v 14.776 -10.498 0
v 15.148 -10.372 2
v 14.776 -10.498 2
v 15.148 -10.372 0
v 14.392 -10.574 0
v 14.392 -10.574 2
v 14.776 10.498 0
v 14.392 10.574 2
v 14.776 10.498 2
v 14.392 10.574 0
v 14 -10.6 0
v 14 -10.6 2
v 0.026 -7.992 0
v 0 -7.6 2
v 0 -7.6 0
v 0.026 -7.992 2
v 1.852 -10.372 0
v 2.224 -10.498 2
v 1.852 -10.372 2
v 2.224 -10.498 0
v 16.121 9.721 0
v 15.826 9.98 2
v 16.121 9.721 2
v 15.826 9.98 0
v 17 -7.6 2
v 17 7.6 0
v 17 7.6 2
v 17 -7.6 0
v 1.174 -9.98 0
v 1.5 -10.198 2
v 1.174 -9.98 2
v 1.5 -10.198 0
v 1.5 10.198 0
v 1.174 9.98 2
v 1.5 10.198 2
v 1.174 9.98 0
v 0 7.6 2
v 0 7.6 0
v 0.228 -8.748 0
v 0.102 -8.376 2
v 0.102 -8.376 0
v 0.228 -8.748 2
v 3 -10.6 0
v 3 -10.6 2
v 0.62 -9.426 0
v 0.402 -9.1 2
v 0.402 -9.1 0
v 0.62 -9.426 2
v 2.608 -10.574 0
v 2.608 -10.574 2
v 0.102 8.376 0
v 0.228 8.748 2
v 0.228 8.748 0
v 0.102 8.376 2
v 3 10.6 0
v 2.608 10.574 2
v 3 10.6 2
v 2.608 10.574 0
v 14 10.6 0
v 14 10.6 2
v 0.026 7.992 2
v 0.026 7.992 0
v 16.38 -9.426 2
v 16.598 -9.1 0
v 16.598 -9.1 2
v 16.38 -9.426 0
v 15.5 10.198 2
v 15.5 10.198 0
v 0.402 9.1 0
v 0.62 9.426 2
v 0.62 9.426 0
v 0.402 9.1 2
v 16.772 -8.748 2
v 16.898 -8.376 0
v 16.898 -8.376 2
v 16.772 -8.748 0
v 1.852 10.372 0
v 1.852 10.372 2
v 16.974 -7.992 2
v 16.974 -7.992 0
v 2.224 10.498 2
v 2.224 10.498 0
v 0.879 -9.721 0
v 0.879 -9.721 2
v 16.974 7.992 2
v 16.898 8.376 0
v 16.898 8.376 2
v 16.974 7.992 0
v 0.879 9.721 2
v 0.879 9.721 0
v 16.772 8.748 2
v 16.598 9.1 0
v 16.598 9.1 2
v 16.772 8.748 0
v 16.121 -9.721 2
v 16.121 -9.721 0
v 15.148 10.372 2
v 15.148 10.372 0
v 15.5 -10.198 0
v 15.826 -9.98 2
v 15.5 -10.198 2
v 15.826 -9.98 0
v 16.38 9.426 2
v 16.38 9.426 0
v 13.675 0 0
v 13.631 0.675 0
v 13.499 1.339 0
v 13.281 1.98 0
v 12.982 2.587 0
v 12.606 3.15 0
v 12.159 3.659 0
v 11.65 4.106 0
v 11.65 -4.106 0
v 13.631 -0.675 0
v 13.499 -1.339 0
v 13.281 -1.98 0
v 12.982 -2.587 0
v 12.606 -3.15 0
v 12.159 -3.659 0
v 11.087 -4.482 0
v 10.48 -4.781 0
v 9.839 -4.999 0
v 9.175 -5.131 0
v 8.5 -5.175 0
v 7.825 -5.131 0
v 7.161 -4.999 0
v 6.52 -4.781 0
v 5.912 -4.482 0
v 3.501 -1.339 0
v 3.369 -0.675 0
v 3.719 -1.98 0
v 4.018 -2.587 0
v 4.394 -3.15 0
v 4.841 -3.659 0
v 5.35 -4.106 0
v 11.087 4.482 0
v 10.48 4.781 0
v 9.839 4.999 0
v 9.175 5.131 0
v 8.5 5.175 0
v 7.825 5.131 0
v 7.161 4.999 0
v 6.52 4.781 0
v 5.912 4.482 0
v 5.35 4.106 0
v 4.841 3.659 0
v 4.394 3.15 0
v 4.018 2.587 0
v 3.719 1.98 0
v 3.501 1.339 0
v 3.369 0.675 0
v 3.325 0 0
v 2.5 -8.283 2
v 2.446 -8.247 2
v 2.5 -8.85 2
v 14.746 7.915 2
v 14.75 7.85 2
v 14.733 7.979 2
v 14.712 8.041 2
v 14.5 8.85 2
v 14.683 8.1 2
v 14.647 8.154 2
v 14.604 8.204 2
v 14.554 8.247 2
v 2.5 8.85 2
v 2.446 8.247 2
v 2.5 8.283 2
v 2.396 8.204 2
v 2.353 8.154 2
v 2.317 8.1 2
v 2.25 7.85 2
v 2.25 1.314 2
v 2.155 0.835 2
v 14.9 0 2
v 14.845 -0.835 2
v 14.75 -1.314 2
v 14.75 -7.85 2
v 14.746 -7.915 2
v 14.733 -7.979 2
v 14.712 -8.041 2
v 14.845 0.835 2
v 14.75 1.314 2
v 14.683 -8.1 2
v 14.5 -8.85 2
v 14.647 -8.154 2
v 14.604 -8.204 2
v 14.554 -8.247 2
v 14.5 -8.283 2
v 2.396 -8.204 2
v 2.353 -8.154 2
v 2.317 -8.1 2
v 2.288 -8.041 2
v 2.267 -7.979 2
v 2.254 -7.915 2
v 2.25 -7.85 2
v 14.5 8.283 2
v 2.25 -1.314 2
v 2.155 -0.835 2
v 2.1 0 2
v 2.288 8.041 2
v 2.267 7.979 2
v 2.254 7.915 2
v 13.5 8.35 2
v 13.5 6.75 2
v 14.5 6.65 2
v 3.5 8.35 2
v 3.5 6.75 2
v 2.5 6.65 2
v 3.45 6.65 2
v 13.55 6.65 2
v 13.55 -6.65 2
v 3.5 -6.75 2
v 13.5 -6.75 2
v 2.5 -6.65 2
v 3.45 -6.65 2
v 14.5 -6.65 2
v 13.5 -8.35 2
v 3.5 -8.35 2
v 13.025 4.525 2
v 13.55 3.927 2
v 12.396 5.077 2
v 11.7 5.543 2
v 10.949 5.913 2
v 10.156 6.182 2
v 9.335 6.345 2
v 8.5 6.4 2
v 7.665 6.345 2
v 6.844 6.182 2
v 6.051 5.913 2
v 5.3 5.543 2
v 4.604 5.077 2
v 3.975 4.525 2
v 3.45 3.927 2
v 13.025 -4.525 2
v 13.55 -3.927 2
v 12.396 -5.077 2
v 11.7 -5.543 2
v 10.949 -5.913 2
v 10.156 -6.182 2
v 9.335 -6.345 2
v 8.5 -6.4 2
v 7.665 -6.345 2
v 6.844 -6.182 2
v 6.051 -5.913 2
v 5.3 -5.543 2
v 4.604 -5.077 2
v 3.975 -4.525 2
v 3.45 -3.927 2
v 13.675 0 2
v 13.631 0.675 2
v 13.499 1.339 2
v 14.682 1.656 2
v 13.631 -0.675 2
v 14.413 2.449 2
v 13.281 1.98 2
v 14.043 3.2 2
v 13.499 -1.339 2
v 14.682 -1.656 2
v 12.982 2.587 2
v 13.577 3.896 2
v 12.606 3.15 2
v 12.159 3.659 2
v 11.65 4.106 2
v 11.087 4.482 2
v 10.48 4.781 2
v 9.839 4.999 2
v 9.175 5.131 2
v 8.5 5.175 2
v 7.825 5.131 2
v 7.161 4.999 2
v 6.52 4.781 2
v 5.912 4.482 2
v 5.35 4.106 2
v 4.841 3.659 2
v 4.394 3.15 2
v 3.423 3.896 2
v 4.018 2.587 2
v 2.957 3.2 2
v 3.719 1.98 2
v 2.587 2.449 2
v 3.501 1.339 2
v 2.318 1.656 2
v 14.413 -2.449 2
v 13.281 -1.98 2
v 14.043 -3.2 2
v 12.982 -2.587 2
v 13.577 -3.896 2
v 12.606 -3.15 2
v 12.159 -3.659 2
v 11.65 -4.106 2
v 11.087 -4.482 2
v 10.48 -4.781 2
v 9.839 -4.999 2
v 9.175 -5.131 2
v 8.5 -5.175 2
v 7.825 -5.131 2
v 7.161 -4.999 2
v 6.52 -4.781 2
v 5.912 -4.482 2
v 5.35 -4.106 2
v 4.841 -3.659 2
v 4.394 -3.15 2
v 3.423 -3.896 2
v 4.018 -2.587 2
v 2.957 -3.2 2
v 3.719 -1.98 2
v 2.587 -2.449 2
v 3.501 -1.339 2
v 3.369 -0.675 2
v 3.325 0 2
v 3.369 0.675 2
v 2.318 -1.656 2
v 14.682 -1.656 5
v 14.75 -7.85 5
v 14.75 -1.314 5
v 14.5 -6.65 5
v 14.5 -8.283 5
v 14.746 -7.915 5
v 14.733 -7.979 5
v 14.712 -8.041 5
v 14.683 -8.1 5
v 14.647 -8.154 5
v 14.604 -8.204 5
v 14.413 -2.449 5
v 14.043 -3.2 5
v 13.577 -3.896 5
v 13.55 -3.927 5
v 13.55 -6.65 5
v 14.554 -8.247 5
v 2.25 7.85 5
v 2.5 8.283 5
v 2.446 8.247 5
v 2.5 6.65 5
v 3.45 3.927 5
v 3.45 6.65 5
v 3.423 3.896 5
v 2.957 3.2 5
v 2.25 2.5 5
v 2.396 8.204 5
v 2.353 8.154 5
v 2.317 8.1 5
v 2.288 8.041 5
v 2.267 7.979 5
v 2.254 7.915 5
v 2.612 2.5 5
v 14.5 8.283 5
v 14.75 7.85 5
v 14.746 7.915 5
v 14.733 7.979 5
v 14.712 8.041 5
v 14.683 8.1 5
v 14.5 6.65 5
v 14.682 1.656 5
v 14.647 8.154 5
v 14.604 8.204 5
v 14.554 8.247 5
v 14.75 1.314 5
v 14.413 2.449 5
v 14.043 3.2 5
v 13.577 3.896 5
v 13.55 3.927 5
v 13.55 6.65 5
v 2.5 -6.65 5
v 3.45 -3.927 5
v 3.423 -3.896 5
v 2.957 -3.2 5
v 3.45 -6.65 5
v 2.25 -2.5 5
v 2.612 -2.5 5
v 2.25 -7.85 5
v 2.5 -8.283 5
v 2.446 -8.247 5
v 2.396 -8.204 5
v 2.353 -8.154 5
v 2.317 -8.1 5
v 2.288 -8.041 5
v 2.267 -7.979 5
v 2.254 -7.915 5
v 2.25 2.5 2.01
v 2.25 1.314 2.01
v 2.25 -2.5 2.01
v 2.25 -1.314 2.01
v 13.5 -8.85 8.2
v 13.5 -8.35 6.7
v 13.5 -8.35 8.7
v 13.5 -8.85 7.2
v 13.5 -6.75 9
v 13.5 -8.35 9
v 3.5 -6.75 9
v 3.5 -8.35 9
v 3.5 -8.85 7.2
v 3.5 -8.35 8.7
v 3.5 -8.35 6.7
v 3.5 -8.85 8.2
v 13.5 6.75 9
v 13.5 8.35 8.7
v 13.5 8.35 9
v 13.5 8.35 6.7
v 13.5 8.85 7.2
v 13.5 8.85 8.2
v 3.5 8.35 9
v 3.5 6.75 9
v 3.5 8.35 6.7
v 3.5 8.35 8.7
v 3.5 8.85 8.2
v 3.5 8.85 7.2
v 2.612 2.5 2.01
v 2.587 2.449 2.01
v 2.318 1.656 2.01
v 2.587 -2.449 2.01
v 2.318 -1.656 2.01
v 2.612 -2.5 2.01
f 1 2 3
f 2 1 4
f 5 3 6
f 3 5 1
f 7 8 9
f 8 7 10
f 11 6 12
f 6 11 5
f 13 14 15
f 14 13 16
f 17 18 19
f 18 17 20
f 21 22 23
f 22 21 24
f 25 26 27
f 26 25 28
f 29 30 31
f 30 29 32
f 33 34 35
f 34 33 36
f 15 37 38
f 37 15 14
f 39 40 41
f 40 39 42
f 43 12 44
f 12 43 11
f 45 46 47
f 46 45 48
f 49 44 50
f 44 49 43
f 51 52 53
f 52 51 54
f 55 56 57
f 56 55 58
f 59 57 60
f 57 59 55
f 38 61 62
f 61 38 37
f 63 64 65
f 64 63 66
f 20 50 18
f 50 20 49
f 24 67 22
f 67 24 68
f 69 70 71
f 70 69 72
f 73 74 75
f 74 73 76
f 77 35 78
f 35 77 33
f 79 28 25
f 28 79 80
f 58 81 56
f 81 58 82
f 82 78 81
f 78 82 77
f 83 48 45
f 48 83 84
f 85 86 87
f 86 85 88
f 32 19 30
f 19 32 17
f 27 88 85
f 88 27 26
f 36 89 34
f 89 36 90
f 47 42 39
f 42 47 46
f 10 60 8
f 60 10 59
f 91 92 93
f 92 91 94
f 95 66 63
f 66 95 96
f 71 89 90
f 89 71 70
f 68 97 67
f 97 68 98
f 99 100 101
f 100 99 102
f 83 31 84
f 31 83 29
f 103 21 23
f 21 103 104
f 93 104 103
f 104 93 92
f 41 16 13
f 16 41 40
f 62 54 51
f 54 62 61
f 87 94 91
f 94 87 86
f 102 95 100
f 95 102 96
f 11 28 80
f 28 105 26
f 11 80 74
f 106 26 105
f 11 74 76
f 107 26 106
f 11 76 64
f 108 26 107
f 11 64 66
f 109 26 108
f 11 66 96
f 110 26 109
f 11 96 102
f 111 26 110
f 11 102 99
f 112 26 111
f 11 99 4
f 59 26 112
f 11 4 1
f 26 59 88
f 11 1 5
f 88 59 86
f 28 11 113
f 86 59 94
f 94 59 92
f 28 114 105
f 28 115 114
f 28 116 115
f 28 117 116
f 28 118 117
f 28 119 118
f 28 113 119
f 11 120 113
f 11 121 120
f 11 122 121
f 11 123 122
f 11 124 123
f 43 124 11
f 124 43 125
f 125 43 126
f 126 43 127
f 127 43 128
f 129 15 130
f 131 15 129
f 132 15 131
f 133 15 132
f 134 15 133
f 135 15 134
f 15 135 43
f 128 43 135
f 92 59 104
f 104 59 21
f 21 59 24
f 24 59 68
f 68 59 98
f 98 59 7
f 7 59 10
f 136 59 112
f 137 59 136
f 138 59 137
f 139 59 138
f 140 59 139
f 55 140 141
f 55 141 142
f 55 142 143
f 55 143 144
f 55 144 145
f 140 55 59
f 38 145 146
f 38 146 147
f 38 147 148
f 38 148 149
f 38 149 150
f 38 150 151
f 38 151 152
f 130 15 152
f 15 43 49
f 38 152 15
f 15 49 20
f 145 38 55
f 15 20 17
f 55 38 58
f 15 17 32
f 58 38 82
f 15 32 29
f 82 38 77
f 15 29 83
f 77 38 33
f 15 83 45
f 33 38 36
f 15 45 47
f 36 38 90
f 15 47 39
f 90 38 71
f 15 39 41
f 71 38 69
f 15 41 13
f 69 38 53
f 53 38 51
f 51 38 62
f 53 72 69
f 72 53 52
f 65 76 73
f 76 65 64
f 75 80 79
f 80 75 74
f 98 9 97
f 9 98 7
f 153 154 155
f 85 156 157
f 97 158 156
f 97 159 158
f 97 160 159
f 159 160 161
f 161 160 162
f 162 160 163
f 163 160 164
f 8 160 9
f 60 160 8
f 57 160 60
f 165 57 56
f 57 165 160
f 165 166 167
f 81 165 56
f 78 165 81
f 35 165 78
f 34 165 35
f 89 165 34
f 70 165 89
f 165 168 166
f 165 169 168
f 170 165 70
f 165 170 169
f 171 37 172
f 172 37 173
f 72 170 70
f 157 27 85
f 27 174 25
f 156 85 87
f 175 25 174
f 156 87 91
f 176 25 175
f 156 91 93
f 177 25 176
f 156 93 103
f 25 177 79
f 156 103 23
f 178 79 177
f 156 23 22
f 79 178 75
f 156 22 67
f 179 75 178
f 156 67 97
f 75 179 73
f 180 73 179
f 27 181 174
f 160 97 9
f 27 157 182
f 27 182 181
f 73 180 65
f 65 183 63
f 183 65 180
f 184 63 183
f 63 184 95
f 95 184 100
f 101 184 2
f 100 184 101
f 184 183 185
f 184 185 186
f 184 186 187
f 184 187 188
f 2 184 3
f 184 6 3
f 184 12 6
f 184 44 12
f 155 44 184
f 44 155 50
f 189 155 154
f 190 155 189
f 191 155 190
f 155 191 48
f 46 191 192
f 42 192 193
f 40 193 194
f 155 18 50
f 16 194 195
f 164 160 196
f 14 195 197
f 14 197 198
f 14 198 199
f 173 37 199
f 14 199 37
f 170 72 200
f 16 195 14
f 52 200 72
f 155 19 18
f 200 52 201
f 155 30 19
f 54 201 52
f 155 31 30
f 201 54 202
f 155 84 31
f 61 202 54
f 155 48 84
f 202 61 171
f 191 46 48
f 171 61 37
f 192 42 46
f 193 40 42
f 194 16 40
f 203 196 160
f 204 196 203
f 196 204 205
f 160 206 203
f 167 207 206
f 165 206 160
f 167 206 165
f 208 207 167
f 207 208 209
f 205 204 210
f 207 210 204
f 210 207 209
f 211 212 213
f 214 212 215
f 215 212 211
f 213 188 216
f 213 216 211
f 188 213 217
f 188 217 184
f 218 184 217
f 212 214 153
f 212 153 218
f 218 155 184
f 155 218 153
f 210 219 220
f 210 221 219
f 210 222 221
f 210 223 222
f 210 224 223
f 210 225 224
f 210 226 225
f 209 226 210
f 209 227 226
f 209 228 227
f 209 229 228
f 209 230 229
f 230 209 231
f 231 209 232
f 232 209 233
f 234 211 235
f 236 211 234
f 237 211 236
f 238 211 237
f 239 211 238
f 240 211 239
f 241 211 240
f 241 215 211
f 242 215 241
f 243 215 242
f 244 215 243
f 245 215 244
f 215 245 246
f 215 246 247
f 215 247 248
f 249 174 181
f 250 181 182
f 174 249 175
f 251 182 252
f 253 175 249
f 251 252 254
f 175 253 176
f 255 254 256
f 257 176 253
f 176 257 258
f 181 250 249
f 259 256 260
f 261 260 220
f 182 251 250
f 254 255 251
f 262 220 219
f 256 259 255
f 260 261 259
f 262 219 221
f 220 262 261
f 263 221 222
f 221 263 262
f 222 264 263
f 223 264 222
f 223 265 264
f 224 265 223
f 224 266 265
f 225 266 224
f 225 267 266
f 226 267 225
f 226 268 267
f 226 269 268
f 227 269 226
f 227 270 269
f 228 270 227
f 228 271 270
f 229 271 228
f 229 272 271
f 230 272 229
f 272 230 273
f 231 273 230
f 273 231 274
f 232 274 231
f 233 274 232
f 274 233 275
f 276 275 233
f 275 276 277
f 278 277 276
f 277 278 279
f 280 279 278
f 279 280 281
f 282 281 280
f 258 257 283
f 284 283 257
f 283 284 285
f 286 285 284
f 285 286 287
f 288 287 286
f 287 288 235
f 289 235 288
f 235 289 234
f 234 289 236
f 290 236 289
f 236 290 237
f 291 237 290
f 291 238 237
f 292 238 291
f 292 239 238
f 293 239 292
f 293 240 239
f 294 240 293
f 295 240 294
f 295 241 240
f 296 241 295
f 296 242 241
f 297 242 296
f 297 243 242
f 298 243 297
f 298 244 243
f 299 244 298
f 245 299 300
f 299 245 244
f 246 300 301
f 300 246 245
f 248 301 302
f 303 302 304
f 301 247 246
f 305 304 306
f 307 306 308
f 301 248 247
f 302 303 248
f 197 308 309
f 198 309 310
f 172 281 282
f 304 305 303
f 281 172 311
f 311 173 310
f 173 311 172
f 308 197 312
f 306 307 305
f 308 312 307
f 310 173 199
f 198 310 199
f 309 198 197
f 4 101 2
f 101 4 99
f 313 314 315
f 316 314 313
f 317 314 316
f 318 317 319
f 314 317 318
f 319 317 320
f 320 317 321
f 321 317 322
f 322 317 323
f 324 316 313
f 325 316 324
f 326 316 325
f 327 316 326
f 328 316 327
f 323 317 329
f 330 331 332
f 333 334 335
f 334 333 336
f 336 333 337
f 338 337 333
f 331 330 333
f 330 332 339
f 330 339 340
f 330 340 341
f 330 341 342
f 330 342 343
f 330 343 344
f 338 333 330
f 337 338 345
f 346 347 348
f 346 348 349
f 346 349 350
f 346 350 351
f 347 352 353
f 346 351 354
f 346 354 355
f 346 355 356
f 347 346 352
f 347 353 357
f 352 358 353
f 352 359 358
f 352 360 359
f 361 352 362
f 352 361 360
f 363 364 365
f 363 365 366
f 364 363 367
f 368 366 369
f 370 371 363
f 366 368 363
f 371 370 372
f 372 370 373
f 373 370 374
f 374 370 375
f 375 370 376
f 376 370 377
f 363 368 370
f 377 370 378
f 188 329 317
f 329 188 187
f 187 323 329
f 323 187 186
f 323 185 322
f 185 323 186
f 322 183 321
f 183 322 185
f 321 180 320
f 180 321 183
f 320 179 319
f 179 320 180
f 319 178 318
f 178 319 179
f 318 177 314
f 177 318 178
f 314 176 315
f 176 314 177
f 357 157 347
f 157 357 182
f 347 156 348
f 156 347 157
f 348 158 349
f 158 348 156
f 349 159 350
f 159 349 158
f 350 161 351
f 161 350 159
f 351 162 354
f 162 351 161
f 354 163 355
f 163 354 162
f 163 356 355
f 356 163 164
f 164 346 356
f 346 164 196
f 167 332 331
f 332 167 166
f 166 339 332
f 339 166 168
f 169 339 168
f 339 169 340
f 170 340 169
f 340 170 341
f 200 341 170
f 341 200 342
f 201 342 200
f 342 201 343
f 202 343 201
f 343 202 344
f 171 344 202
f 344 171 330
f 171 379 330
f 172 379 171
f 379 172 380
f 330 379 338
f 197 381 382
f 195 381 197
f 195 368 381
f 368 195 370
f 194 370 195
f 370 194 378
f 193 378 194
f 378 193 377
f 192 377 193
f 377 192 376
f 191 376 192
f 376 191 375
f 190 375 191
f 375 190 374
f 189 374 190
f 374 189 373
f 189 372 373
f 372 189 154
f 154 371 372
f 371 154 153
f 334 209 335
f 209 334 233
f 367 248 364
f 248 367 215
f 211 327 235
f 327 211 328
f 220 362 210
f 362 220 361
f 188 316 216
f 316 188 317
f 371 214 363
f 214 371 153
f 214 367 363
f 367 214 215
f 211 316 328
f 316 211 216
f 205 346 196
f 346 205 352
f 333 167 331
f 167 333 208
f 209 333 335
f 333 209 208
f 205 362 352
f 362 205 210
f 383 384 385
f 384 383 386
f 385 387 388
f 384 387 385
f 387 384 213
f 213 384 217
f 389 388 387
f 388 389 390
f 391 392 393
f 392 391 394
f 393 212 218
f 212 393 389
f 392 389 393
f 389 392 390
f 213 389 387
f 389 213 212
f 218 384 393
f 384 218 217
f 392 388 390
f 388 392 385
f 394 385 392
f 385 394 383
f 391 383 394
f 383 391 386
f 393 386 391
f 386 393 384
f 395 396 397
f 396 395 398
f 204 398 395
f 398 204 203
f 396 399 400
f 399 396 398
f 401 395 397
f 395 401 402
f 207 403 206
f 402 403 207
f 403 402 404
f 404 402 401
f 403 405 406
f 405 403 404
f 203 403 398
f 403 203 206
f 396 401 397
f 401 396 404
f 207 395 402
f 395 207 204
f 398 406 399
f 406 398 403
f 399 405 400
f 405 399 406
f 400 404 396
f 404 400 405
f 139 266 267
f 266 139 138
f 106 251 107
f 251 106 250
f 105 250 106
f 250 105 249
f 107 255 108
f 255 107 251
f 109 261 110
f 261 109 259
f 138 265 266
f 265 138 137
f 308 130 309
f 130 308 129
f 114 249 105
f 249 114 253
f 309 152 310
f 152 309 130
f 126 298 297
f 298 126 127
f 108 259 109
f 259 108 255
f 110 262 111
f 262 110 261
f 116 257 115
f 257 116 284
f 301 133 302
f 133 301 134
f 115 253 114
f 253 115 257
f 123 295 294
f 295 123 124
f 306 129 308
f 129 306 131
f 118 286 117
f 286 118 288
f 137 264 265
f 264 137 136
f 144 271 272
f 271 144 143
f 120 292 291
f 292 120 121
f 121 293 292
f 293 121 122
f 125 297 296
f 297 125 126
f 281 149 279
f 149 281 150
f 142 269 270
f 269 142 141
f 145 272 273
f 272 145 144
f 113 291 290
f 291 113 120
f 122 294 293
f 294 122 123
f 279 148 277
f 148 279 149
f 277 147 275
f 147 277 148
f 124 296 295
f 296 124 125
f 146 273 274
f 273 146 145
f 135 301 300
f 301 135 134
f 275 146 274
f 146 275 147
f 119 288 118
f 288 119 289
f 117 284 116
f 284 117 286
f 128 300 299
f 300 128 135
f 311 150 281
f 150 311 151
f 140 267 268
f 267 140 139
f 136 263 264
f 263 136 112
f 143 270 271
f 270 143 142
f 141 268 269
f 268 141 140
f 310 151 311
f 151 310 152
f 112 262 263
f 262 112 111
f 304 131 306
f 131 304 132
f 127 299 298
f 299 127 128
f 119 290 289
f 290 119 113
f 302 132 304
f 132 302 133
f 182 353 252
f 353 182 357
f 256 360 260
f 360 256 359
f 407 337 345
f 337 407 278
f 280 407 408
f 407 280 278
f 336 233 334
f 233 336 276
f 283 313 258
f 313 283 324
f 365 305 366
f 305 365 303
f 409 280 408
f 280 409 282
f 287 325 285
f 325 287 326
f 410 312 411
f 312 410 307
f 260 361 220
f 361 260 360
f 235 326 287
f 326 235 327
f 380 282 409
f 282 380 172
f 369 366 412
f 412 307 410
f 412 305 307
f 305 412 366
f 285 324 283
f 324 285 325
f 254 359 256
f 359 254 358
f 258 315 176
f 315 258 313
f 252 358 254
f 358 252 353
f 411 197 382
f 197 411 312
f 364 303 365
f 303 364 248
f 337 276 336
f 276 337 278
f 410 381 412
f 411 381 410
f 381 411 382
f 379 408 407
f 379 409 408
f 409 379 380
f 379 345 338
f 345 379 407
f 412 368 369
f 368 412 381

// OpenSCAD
// =====================================================================
//  MorseLink wrist case v10  (LilyGO T-Beam V1.2) -- FLIPPED BOARD
//  Modular: base, two bolted bars, bolted button pod, hinged lid.
// ---------------------------------------------------------------------
//  Axes, AS WORN with arm = "right" (the owner's build: case on the back
//  of the LEFT forearm):
//    X runs along the forearm: x = 0 is the ELBOW end, x = L the HAND end.
//    Z is up, away from the skin.
//    The pod and the USB are on the thumb side, the antenna on the pinky side.
//    (Model code builds the thumb side at +y; pinky() mirrors to -y and
//    arm_m() mirrors everything for arm = "right".)
//
//  v10 (19 Oct), what changed from v9:
//    * Bars (wings) are separate parts, bolted at each end (vertical M3)
//      onto flat lugs on the base, flush with its floor (nut in a hex
//      recess underneath).  Same 45 deg profile.  The band slot is now
//      VERTICAL (straight up and down when the bar prints upside down) and
//      shorter (86 mm).  The base prints upright on its floor, no supports.
//    * Lid: flat top (30 mm) + two 45 deg flats, hinged at the elbow end on
//      an M3 bolt across, a click flap over the hand-end wall holds it
//      shut.  Prints upside down, flat top on the bed, no supports.  The
//      snap tabs, their pockets, the pry notch and lid_end are gone.
//    * Button pod: separate part, pod_angle 45, bolted to the thumb wall
//      with one M3 at each end (horizontal, nut inside the case).  Prints
//      on its flat back.  Moved 8 mm toward the elbow so the hand-end bolt
//      lands on the straight wall.  Pry notches now on its hand and elbow
//      faces.
//    * Antenna connector and clip 2 mm toward the hand (ant_x 15, clip_x
//      78) to clear the bar bolt; patch's underside cut at 45 deg above
//      the pinky bar.
//
//  Parts (pick one with `part`, F6, export STL).  All in print orientation:
//    "assembly"   everything in place, with ghost board/battery/antenna/bolts
//    "base"       upright on its floor, no supports
//    "bar_thumb"  thumb bar (USB cut-away), upside down, no slicer supports:
//                 thin breakaway ribs (bar_ribs) hold up the outer bar's
//                 edge, which starts in mid-air; snap them off after printing
//    "bar_pinky"  pinky bar, the same
//    "pod"        button pod, on its flat back, no supports
//    "lid"        upside down, flat top on the bed, no supports
//    "pod_lid"    button pod lid (top-down, no supports)       -- unchanged
//    "cap"        button plunger (upside down, no supports)    -- unchanged
//    "clip"       antenna clip, flat, no supports               -- unchanged
//    "clip_test"  three antenna clips, 1 notch = tightest .. 3 = loosest
//
//  Hardware: 8 x M3 + 8 nuts.
//    4 x M3x8   bars to base (head on the bar, nut in the lug underneath)
//    2 x M3x10  pod to the thumb wall (head on the pod, nut inside the case)
//    1 x M3x30  lid hinge (pin), nut on the end
//    1 x M3x12-16 antenna clip (as v9)
//
//  Assembly order:
//    1. Button: wires from inside the case through the small hole into
//       the pod, soldered to two DIAGONALLY OPPOSITE legs of the switch
//       (legs bent out flat).  Switch between the four posts with a dab
//       of hot glue.  Cap into the pod lid from underneath, snap the pod
//       lid on.  Bolt the pod to the thumb wall (nuts inside).
//    2. Motors and their wires out through the big hole in the elbow end.
//    3. Antenna (before the board): SMA bulkhead through the pinky wall
//       from inside (hex in the pocket), nut outside, u.FL to the board.
//    4. Board, driver veroboard (taped to the pinky wall).
//    5. Lid: knuckle between the base knuckles, M3x30 across, nut.  Swing
//       it down until the flap clicks over the hand-end wall.
//    6. Bars: nut into each lug's hex recess (from below; a bit of
//       Blu-tack holds it), slide the bar in against the side wall, M3x8
//       down through the bar into the nut.
//    7. Antenna: screw on, bend the hinge 90 deg, bolt the clip, press the
//       element in.  Without the antenna the firmware must not transmit.
//    8. Band and strap: up through the slots, round the bars.
//
//  All sizes in mm.  MEASURE = estimate, check against your parts.
// =====================================================================

part = "pod_lid";
arm  = "right";       // the owner's build (see Axes above)

/* ---------- T-Beam ---------- */
board_l     = 100.5;  // MEASURE  PCB length
board_w     = 33.0;   // MEASURE  PCB width
board_pcb_z = 19.5;   // battery side: PCB surface to the top of the cell
under_clear = 2.5;    // MEASURE  pillar height under the board
holder_w    = 21.0;   // MEASURE  width of the 18650 holder
top_clr     = 0.0;    // gap between the cell and the lid: 0 = flush (raise to 0.3 if the lid won't close)
usb_drop    = 1.4;    // MEASURE  port centre below the PCB's component side

/* ---------- Locating pillars through the T-Beam's mounting holes ---------- */
hole_sx       = 95.1;    // measured: hole centre to centre along the board
hole_sy       = 27.8;    // measured: hole centre to centre across the board
mount_holes   = [for (i = [0, 1], j = [0, 1])
                   [(board_l - hole_sx)/2 + i*hole_sx, (board_w - hole_sy)/2 + j*hole_sy]];
mount_hole_d  = 2.0;
pillar_d      = 4.5;
pin_clr       = 0.5;
pin_above     = 1.5;

/* ---------- Driver veroboard, on edge against the pinky wall (taped in) ---------- */
drv_l       = 30;     // MEASURE
drv_h       = 11;     // MEASURE  height standing up (the console prints the most that fits)
drv_t       = 1.6;
drv_comp    = 5;      // MEASURE  tallest component, facing the battery
drv_x       = 0;      // shift along the arm

/* ---------- Shell ---------- */
wall      = 2.0;
floor_t   = 2.0;
lid_t     = 2.0;
clr       = 1.0;      // gap round the T-Beam (ends and thumb side)
thumb_gap = 3;        // extra channel on the thumb side
pinky_gap = 1.6;      // board edge to the pinky wall
corner_r  = 3;

/* ---------- Lid: flat top + two flats, hinged at the elbow end ---------- */
lid_flat_w   = 30;    // outer width of the flat top (sets the side-wall height)
lid_side_ang = 45;    // side flats, degrees below horizontal
lid_gx       = 0.2;   // gap between the lid and the hand-end wall
lid_lip_h    = 2.5;   // lips down inside the side walls
lid_lip_t    = 1.2;
lid_lip_clr  = 0.25;
hg_r         = 3.75;  // hinge knuckle radius
hg_out       = 3.5;   // hinge axis this far outside the elbow-end wall (bolt head and nut clear the wall)
hg_kl        = 4.3;   // lid knuckle: y from -hg_kl to +hg_kl
hg_ko        = 10.8;    // base knuckles: from hg_kl + hg_gap out to hg_ko, both sides
hg_gap       = 0.4;   // between knuckles
hg_clr       = 0.3;   // clearance round each knuckle
hg_zg        = 0.2;   // lid's end plate above the elbow-end wall
fl_w         = 12;    // click flap over the hand-end wall: width
fl_t         = 1.2;   // flap thickness (thin = springy)
fl_h         = 10;    // flap length down from the lid top
fl_gap       = 0.2;   // flap to the end wall
fl_bump      = 0.6;   // click bump: +0.2 tighter, -0.2 looser
fl_bump_h    = 2.0;
fl_bump_z    = 2;     // bump's bottom above the flap's lower edge
fl_groove_d  = 1.0;   // groove in the end wall that the bump drops into

/* ---------- Pod-lid snap (unchanged from v9) ---------- */
lip_h    = 3;
lip_t    = 1.2;
lip_clr  = 0.25;
tab_w    = 10;
tab_len  = 7;
tab_t    = 1.6;
bump     = 0.5;
bump_h   = 2.0;
recess_d = 1.0;
tab_gap  = 1.0;

/* ---------- Bars (separate, bolted; the same on both sides) ---------- */
wing_angle = 45;      // degrees below horizontal (v9 profile)
wing_t     = 3;       // plate thickness
bar_len_s  = 14.25;   // plate length along its underside, case edge to tip (v9: 4 + 5.25 + 5)
root_fil   = 2;       // fillet at the plate's root
slot_u     = 3.9;     // band slot: inner wall, out from the case side.  The slot is VERTICAL
slot_w     = 5.25;    // band slot width, measured across (horizontal)
bar_gap    = 0.3;     // bar to the case side wall
bar_root_u = 3.0;     // root strip against the wall, out to here
bar_top    = 7.5;     // top of the root strip and end tabs (on the bed when printed)
bar_end    = 1.2;     // solid plate between each end cap and the slot
lug_t      = 4;       // base lug thickness (flush with the floor)
lug_u      = 3.8;     // bar bolt: out from the case side
lug_r      = 4.2;     // lug radius round the bolt
lug_dx     = 4.5;     // bar bolt from each case end
lug_clr    = 0.25;    // bar tab above the lug (the bolt pulls it down)
bar_ribs   = true;    // breakaway ribs under the outer bar in the print STLs (it starts in mid-air when printed upside down)
rib_t      = 0.8;     // rib thickness (along the arm)
rib_g      = 0.25;    // air gap between rib and bar (about one layer)
rib_sp     = 12;      // max spacing: the outer bar bridges between ribs
nut_af     = 5.5;     // M3 nut across flats
nut_h      = 2.4;
nut_clr    = 0.4;
bolt_d     = 3;       // M3
bolt_clr_flat = 0.5;  // extra on holes printed flat (vertical in print)
bolt_clr_base = 0.8;  // extra on holes printed sideways (horizontal in print)

/* ---------- Antenna: SMA bulkhead through the pinky wall, hinge bent 90 deg ---------- */
ant_x      = 15;      // connector from the elbow end (v9 13: +2 to clear the bar bolt)
ant_z      = 12.5;    // connector axis height
ant_plate_r= 6.75;    // thickened patch of wall round the connector
plate_t    = 2.5;
sma_hole_d = 7.2;
sma_flat   = 0;
sma_hex_af = 8.4;     // MEASURE
sma_hex_d  = 1.5;
sma_back   = 8;       // MEASURE
ant_d0     = 9.0;     // element diameter at the bend (measured)
ant_d1     = 8.0;     // element diameter at the tip (measured)
ant_nut    = 2;       // MEASURE  panel nut on the outside
ant_reach  = 30;      // measured
ant_len    = 90;      // element, hinge to tip

/* ---------- Element clip, bolted to a tab on the base (unchanged, moved with the antenna) ---------- */
clip_x     = 78;      // v9 76: +2 with the connector
clip_t     = 4;
clip_wall  = 2;
ctab_t     = 4;
bolt_u     = 4.5;
bolt_boss_r= 4;
clip_foot  = 9;
foot_gap   = 0.3;

/* ---------- Motors and their wires ---------- */
tail_end  = "elbow";
tail_hole = [14, 8];

/* ---------- Button pod (separate, bolted to the thumb wall) ---------- */
pod_angle   = 45;     // button face tilt from horizontal (v9 25)
pod_raise   = -4.5;   // pod top this far above the side-wall top
pod_x       = -1;     // shift toward the hand (v9 7; -1 puts the hand-end bolt on the straight wall)
pod_wgap    = 0.3;    // pod's flat back to the thumb wall
pod_fl      = 1.2;
switch_w    = 6;
switch_h    = 5.0;    // MEASURE
sw_post_d   = 1.6;
sw_post_h   = 1.5;
link_hole_d = 3.0;    // wires into the pod (v9 3.5: at 45 deg a bigger hole reaches the cap's collar)
link_up     = 0.6;    // wire hole's bottom above the pod's cavity floor (v9 0.9)
podlug_t    = 3;      // pod lugs: flat against the wall
podlug_r    = 3.75;   // lug radius round the bolt
podlug_z0   = 11.5;   // lug's lower edge (above the bar bolt heads)
podlug_dx   = 3.5;    // bolt from the pod's end face

/* ---------- Button cap ---------- */
cap_d     = 10;
cap_hole  = cap_d + 0.35;
cap_proud = 1.5;
stem_d    = 7;
flange_d  = 12.0;
collar_t  = 0.8;
cap_gap   = 0.3;
cap_stem  = 0.3;

/* ---------- USB ---------- */
usb_x     = 44;
usb_shift = -4.5;
usb_w     = 15;
usb_h     = 11;
extra_cutouts = [];

$fn = 48;

// =====================================================================
//  Derived: main box
// =====================================================================
drv_above  = pinky_gap < drv_t + 0.5;
inner_w    = board_w + clr + thumb_gap + pinky_gap;
W          = inner_w + 2*wall;
y_thumb_in = W/2 - wall;
y_pinky_in = -W/2 + wall;
board_y0   = y_thumb_in - clr - thumb_gap - board_w;
pcb_bot    = floor_t + under_clear;
pcb_top    = pcb_bot + 1.6;
cell_top   = pcb_top + board_pcb_z;
H_top      = cell_top + top_clr + lid_t;                              // flat top, outside
H_side     = H_top - (W/2 - lid_flat_w/2)*tan(lid_side_ang);          // side-wall top
H          = H_side;
board_yc   = board_y0 + board_w/2;
board_x0   = wall + clr;
board_x1   = board_x0 + board_l;
L          = board_x1 + clr + wall;
drv_xc     = (board_x0 + board_x1)/2 + drv_x;
drv_y      = y_pinky_in + (drv_above ? 0 : 0.5);
drv_z0     = drv_above ? pcb_top + 0.5 : floor_t;
drv_hmax   = H_side - lid_lip_h - 0.3 - drv_z0;

// ---------- hinge (axis along y)
hg_ax   = -hg_out;
hg_az   = H_top - hg_r;                         // knuckle tops flush with the lid top
hg_zw   = hg_az + hg_ax - hg_r*sqrt(2);         // 45 deg underside of the base knuckles meets the wall here
hg_hole = bolt_d + bolt_clr_base;
// elbow-end wall stops at the hinge axis; the lid's end plate covers it above

// ---------- bars.  Profile (u = out from the case side, v = up from the case bottom)
wa      = wing_angle; cw = cos(wa); sw = sin(wa); ta = tan(wa);
w_h     = wing_t/cw;
w_drop  = bar_len_s*sw;
w_reach = (w_drop + w_h)/ta;
bar_xs  = [lug_dx, L - lug_dx];                  // bar bolts
pocket_u1 = lug_u + lug_r + 0.3;                 // bar's pocket round the lug
cap_u1  = pocket_u1 + 2;                         // end cap's outer web
cap_x1  = lug_dx + lug_r + 0.3 + bar_end;        // end cap length; the slot starts here
slot_len= L - 2*cap_x1;
nut_rc  = (nut_af + nut_clr)/sqrt(3);            // hex recess corner radius

// ---------- antenna
plate_full = plate_t + (sma_hex_af > 0 ? sma_hex_d : 0);
boss_t     = max(0, plate_full - wall);
ant_out    = boss_t + ant_nut + ant_reach - ant_d0/2;
ant_tip    = ant_x + ant_len;
hex_r      = sma_hex_af/2/cos(30);
ant_skin   = ant_out*sw + ant_z*cw - ant_d0/2;
ant_d      = ant_d0 - (ant_d0 - ant_d1)*(clip_x + clip_t/2 - ant_x)/ant_len;
clip_r_in  = ant_d/2 - 0.2;
clip_r_out = clip_r_in + clip_wall;
tab_x0     = clip_x - ctab_t;
tab_zw     = w_h + root_fil + 0.3;               // as v9 (clip unchanged)
bolt_z     = tab_zw + bolt_u + bolt_boss_r*sqrt(2) + 0.3;

// ---------- motor hole
tail_yc = (W/2 - wall)/2;
tail_zc = H_side/2;

// =====================================================================
//  Derived: button pod.  Pod-local frame: X = down the face (outward),
//  Y = along the forearm (toward the hand), Z = out of the face.
// =====================================================================
cp = cos(pod_angle); sp = sin(pod_angle);
pin_w   = flange_d + 1;
pin_l   = flange_d + 2*(lip_clr + tab_t) + 1.5;
cham    = (flange_d - cap_d)/2;
pin_h   = switch_h + collar_t + cham + cap_gap + cap_stem;
pd      = pin_h + pod_fl;
pw      = pin_w + 2*wall;
pl      = pin_l + 2*wall;
pod_xc  = L - wall - pl/2 - 8 + pod_x;
pod_x0  = pod_xc - pl/2;
pod_x1  = pod_xc + pl/2;
pod_y0  = W/2 + pod_wgap + sp*pd;               // cup's inner bottom edge sits at the pod's flat back
pod_z0  = H_side + pod_raise;
pod_M   = [[0, -1, 0, pod_xc], [cp, 0, sp, pod_y0], [-sp, 0, cp, pod_z0], [0, 0, 0, 1]];
function pod_pt(X, Y, Z) = [pod_xc - Y, pod_y0 + X*cp + Z*sp, pod_z0 - X*sp + Z*cp];
function pod_under_z(y) = pod_z0 - sp*(y - pod_y0 + pd*sp)/cp - pd*cp;
btn_X   = wall + pin_w/2;
sw_top  = -pin_h + switch_h;
cap_ft  = -cap_gap - sw_top;
cap_top = lid_t + cap_proud - sw_top;
stem_len= cap_ft - cham - collar_t;
link_z    = pod_z0 + (-pin_h + link_up)*cp - sp*wall + link_hole_d/2;
link_Ztop = (sp*wall + (link_z - pod_z0) + link_hole_d/2)/cp;
cav_corner= pod_pt(wall, 0, -pin_h);
pod_gap   = pod_under_z(W/2 + slot_u) - (w_h - slot_u*ta);   // pod underside above the bar at the slot
pod_out   = pod_pt(pw, 0, -pd);                              // pod's outer bottom edge
pb_z      = podlug_z0 + podlug_r;                            // pod bolts: height
pb_xs     = [pod_x0 - podlug_dx, pod_x1 + podlug_dx];        //            along the arm
pb_nut_top= pb_z + nut_af/sqrt(3) + 0.05;                    // pod nut inside, worst case

usb_xw  = board_x0 + board_l - usb_x + usb_shift;
usb_z   = pcb_bot - usb_drop;
usb_top = usb_z + usb_h/2;
usb_k0  = usb_xw - usb_w/2 - 1;
usb_k1  = usb_xw + usb_w/2 + 1;
cutouts = extra_cutouts;

// ---------- checks
assert(lid_flat_w < W - 4, "lid_flat_w too wide for the case");
assert(H_side >= ant_z + hex_r + lid_lip_h + 0.3, "SMA connector hits the lid's lip inside: lower ant_z or lid_flat_w wider");
assert(ant_z - hex_r >= pcb_top + 0.5, "SMA connector sits on the board: raise ant_z");
assert(drv_comp <= pinky_gap - drv_t - (drv_above ? 0 : 0.5) + (board_w - holder_w)/2 - 0.5,
       "driver components won't fit beside the battery holder");
assert(drv_h <= drv_hmax, str("driver veroboard too tall: ", drv_hmax, " mm fits under the lid's lip"));
assert(hg_out >= nut_af/sqrt(3) + 0.2, "hinge nut hits the elbow-end wall: raise hg_out");
assert(hg_zw >= tail_zc + tail_hole[1]/2 + 0.2, "hinge knuckles run into the motor hole");
assert(hg_ko + 3 <= W/2 - corner_r, "hinge too wide");
assert(wing_angle >= 20 && wing_angle <= 60, "wing_angle outside 20..60");
assert(slot_u >= bar_root_u + 0.5 && slot_u >= root_fil + 0.5, "band slot runs into the bar's root: raise slot_u");
assert(w_reach - (slot_u + slot_w) >= 4, "bar outside the slot too thin: lower slot_u or slot_w");
assert(slot_len >= 80, str("band slot only ", slot_len, " mm (want 80+)"));
assert(lug_u - nut_rc >= 0.3, "nut recess in the bar lug runs into the case wall: raise lug_u");
assert(lug_dx - lug_r >= 0.2, "bar lug runs past the case end: raise lug_dx");
assert(bar_top - lug_t - lug_clr >= 2.5, "bar end tab too thin");
assert(ant_x - ant_plate_r >= lug_dx + 2.75 + 0.5, "SMA patch runs into the bar bolt head: raise ant_x");
assert(ant_tip <= L, "antenna tip runs past the hand end: lower ant_x");
assert(clip_x + clip_t < ant_tip - 3, "clip is past the antenna tip: lower clip_x");
assert(clip_x - ctab_t > ant_x + ant_plate_r + 5, "clip tab too close to the connector");
assert(bolt_z + bolt_boss_r <= H_side - 0.3, "clip tab sticks up past the wall top: the lid won't go on");
assert(bolt_z - clip_foot >= bar_top + 0.3, "clip's foot sits on the pinky bar");
assert(tail_yc + tail_hole[0]/2 <= W/2 - corner_r && tail_yc - tail_hole[0]/2 >= 0,
       "motor hole doesn't fit between the centre line and the thumb wall");
assert(link_Ztop < -(collar_t + cham + cap_gap) - 0.3, "pod wire hole reaches the cap's collar");
assert(link_z + link_hole_d/2 <= H_side - lid_lip_h - 0.25, "pod wire hole hits the lid's lip: lower pod_raise");
assert(cav_corner[1] > W/2 + pod_wgap + 1.2, "pod cavity too close to its back");
assert(pod_gap > 5, "pod too low: the band can't get round the thumb bar under it");
assert(pod_x1 <= L - cap_x1 - 0.3, "pod runs into the thumb bar's hand-end cap: lower pod_x");
assert(pb_xs[1] + nut_af/sqrt(3) <= L - wall - 1, "pod's hand-end nut runs into the case corner: lower pod_x");
assert(podlug_z0 >= bar_top + 3 + 0.4, "pod lugs sit on the bar bolt heads: raise podlug_z0");
assert(pb_nut_top <= H_side - lid_lip_h - 0.2, "pod nuts inside hit the lid's lip: lower podlug_z0");
assert(podlug_dx >= 2.75 + 0.5, "pod bolt head hits the pod: raise podlug_dx");
assert(usb_k1 < pb_xs[0] - podlug_r - 0.5, "USB opening runs into the pod's elbow-end lug");
assert(stem_len >= 0, "cap stem negative");

echo(str("Main box: ", L, " x ", W, "; ", H_side, " tall at the sides, ", H_top, " on the flat top"));
echo(str("Lid: flat top ", lid_flat_w, ", sides ", lid_side_ang, " deg; hinge axis ", hg_out, " mm outside the elbow end, ",
         hg_az, " up; base knuckle underside meets the wall at ", hg_zw));
echo(str("Bars: reach ", w_reach, " mm out, ", w_drop, " below the case bottom; band slots ", slot_len,
         " mm long (x ", cap_x1, " to ", L - cap_x1, "), ", slot_w, " wide, vertical; bolts at x ", bar_xs, ", ", lug_u, " mm out"));
echo(str("Antenna: connector ", ant_x, " mm from the elbow end, ", ant_z, " up; element ", ant_out,
         " mm out; tip ", L - ant_tip, " mm short of the hand end"));
echo(str("Clip: x ", clip_x, " to ", clip_x + clip_t, "; bolt ", bolt_u, " mm out, ", bolt_z, " up"));
echo(str("Pod: x ", pod_x0, " to ", pod_x1, "; ", pw, " x ", pl, " x ", pd, " deep; top ", pod_z0, " up; sticks out ",
         pod_out[1] - W/2, " mm; ", pod_gap, " mm above the band at the slot; bolts at x ", pb_xs, ", ", pb_z, " up"));
echo(str("Driver veroboard: max height ", drv_hmax, " mm"));
echo(str("USB opening: centre ", usb_xw, " mm from the elbow end, ", usb_z, " mm up, top at ", usb_top));
echo(str("Motor hole: ", tail_hole[0], " x ", tail_hole[1], ", centre ", tail_zc, " up"));

// =====================================================================
//  Helpers
// =====================================================================
module arm_m() { if (arm == "right") mirror([0, 1, 0]) children(); else children(); }
module pinky() { mirror([0, 1, 0]) children(); }

module rr(x0, x1, y0, y1, r) {
  r2 = min(r, (x1-x0)/2 - 0.01, (y1-y0)/2 - 0.01);
  translate([x0 + r2, y0 + r2]) offset(r = r2) square([x1-x0-2*r2, y1-y0-2*r2]);
}
// 2D profile in (u = out from the case side, v = up), extruded along x, on the +y side
module along_x(x0, len) { translate([x0, W/2, 0]) rotate([90, 0, 90]) linear_extrude(len) children(); }
// 2D profile in (y, z), extruded along x from x0 to x1
module prism_x(x0, x1) { translate([x0, 0, 0]) rotate([90, 0, 90]) linear_extrude(x1 - x0) children(); }
// 2D shape in (x, z), extruded across y from y0 to y1
module across_y(y0, y1) { translate([0, y1, 0]) rotate([90, 0, 0]) linear_extrude(y1 - y0) children(); }

// half-hexagon outline of the case top, (y, z)
module prof2d(z0) {
  polygon([[-W/2, z0], [-W/2, H_side], [-lid_flat_w/2, H_top], [lid_flat_w/2, H_top], [W/2, H_side], [W/2, z0]]);
}
module prof_in2d() { offset(delta = -lid_t) prof2d(H_side - 30); }

module cutouts_3d() {
  for (c = cutouts) {
    side = c[0]; p = c[1]; z = c[2]; w = c[3]; h = c[4];
    if (side == "elbow") translate([-1, p - w/2, z - h/2]) cube([wall + 2, w, h]);
    if (side == "hand")  translate([L - wall - 1, p - w/2, z - h/2]) cube([wall + 2, w, h]);
    if (side == "thumb") translate([p - w/2, W/2 - wall - 1, z - h/2]) cube([w, wall + 2, h]);
    if (side == "pinky") translate([p - w/2, -W/2 - 1, z - h/2]) cube([w, wall + 2, h]);
  }
}

// ---------- pod-lid snap (unchanged from v9)
function pod_tabs()  = [for (s = [-1, 1]) [btn_X, s]];
module snap_lid(x0, x1, y0, y1, tabs) {
  lx0 = x0 + lip_clr; lx1 = x1 - lip_clr; ly0 = y0 + lip_clr; ly1 = y1 - lip_clr;
  difference() {
    union() {
      linear_extrude(lid_t) rr(x0 - wall, x1 + wall, y0 - wall, y1 + wall, corner_r);
      translate([0, 0, -lip_h]) linear_extrude(lip_h + 0.01) difference() {
        rr(lx0, lx1, ly0, ly1, 0.5);
        rr(lx0 + lip_t, lx1 - lip_t, ly0 + lip_t, ly1 - lip_t, 0.5);
      }
    }
    for (t = tabs) {
      yy = t[1] > 0 ? ly1 - lip_t - 0.5 : ly0 - 0.5;
      translate([t[0] - tab_w/2 - tab_gap, yy, -lip_h - 1]) cube([tab_w + 2*tab_gap, lip_t + 1, lip_h + 1]);
    }
  }
  snap_tabs_only(tabs, ly0, ly1);
}
module snap_tabs_only(tabs, ly0, ly1) {
  for (t = tabs) {
    s = t[1];
    yo = s > 0 ? ly1 : ly0;
    translate([t[0] - tab_w/2, 0, 0]) {
      translate([0, s > 0 ? yo - tab_t : yo, -tab_len]) cube([tab_w, tab_t, tab_len + 0.5]);
      translate([0, yo, -tab_len + 0.3]) rotate([90, 0, 90]) linear_extrude(tab_w)
        polygon(s > 0 ? [[0, 0], [bump, bump], [bump, bump_h - bump], [0, bump_h]]
                      : [[0, 0], [-bump, bump], [-bump, bump_h - bump], [0, bump_h]]);
    }
  }
}
module snap_pockets(y0, y1, z_top, tabs) {
  for (t = tabs) {
    yw = t[1] > 0 ? y1 - 0.01 : y0 - recess_d + 0.01;
    translate([t[0] - tab_w/2 - 0.5, yw, z_top - tab_len - 0.1]) cube([tab_w + 1, recess_d, bump_h + 0.8]);
  }
}

module sma_hole2d() {
  intersection() {
    circle(d = sma_hole_d);
    if (sma_flat > 0) translate([-sma_hole_d/2, -sma_flat]) square([sma_hole_d, sma_hole_d]);
    else circle(d = sma_hole_d);
  }
}

// =====================================================================
//  Bars (separate parts).  Built on the +y side, in place.
// =====================================================================
module wing_solid2d() {     // v9 profile: plate from the case's bottom edge, flat foot, root fillet
  polygon([[-1.5, 0], [0, 0], [w_drop/ta, -w_drop], [w_reach, -w_drop],
           [root_fil, w_h - root_fil*ta], [0, w_h + root_fil], [-1.5, w_h + root_fil]]);
}
module wing2d() { offset(r = 0.8) offset(delta = -0.8) wing_solid2d(); }
module bar2d() {            // cross-section along the slot
  intersection() { wing2d(); translate([bar_gap, -50]) square([100, 100]); }
  translate([bar_gap, 0]) square([bar_root_u - bar_gap, bar_top]);
}
module cap2d() {            // cross-section at each end: tab over the lug, web outside it
  hull() {
    bar2d();
    translate([bar_gap, lug_t + lug_clr]) square([cap_u1 - bar_gap, bar_top - lug_t - lug_clr]);
  }
}
module bar(usb) {
  difference() {
    union() {
      along_x(0, L) bar2d();
      along_x(0, cap_x1) cap2d();
      along_x(L - cap_x1, cap_x1) cap2d();
    }
    // band slot, vertical
    translate([0, W/2, -30]) linear_extrude(60) rr(cap_x1, L - cap_x1, slot_u, slot_u + slot_w, 1);
    for (xb = bar_xs) {
      // pocket round the base lug: open toward the wall and underneath
      translate([xb - lug_r - 0.3, W/2 - 5, -30]) cube([2*(lug_r + 0.3), 5 + pocket_u1, 30 + lug_t + lug_clr]);
      translate([xb, W/2 + lug_u, -1]) cylinder(d = bolt_d + bolt_clr_flat, h = bar_top + 2, $fn = 24);
    }
    if (usb) {   // USB plug: everything inside the slot cut away, as in v9
      translate([usb_k0, W/2 - 1, -30]) cube([usb_k1 - usb_k0, 1 + slot_u + 0.01, 60]);
      translate([usb_k0, W/2 - 1, usb_z - usb_h/2]) cube([usb_k1 - usb_k0, w_reach + 5, 40]);
    }
  }
}
module bar_thumb() { bar(true); }
module bar_pinky() {        // +y side; pinky() puts it in place
  difference() {
    bar(false);
    along_x(tab_x0 - 0.3, ctab_t + 0.6) offset(r = 0.3) clip_tab2d();   // root notched under the clip tab
  }
}

// breakaway print ribs: fill the slot locally, up to just under the outer bar (snap off after printing)
module bar_ribs3d() {
  n = ceil(slot_len/rib_sp) - 1;
  u0 = slot_u + 0.5; u1 = slot_u + slot_w + 1.6;
  for (i = [1 : n]) along_x(cap_x1 + i*slot_len/(n + 1) - rib_t/2, rib_t)
    polygon([[u0, w_h - u0*ta + rib_g], [u1, w_h - u1*ta + rib_g], [u1, bar_top], [u0, bar_top]]);
}

// lugs on the base, flush with the floor; hex nut recess underneath
module base_lugs() {
  for (xb = bar_xs) difference() {
    linear_extrude(lug_t) hull() {
      translate([xb, W/2 + lug_u]) circle(r = lug_r);
      translate([xb - lug_r, W/2 - 1.9]) square([2*lug_r, 1.9]);
    }
    translate([xb, W/2 + lug_u, -1]) cylinder(d = bolt_d + bolt_clr_flat, h = lug_t + 2, $fn = 24);
    translate([xb, W/2 + lug_u, -0.01]) rotate([0, 0, 30]) cylinder(r = nut_rc, h = nut_h + 0.2 + 0.01, $fn = 6);
  }
}

// =====================================================================
//  Antenna (+y side; base() puts it on the pinky side)
// =====================================================================
module sma_boss() {         // patch outside the wall; its underside rises at 45 deg above the bar
  if (boss_t > 0) intersection() {
    translate([ant_x, W/2 - 0.5, ant_z]) rotate([-90, 0, 0]) cylinder(r = ant_plate_r, h = boss_t + 0.5);
    along_x(ant_x - ant_plate_r - 1, 2*ant_plate_r + 2)
      polygon([[-1, bar_top + 0.3 - bar_gap - 1], [boss_t + 1, bar_top + 0.3 + boss_t + 1 - bar_gap], [boss_t + 1, 40], [-1, 40]]);
  }
}
module sma_cuts() {
  translate([ant_x, W/2 - wall - 1, ant_z]) rotate([-90, 0, 0]) linear_extrude(plate_full + 2) sma_hole2d();
  if (sma_hex_af > 0) translate([ant_x, W/2 - wall - 0.01, ant_z]) rotate([-90, 0, 0])
    linear_extrude(sma_hex_d + 0.01) circle(r = hex_r, $fn = 6);
}
module clip_tab2d() {
  hull() {
    translate([-1, tab_zw - 1]) square([1, bolt_z + bolt_boss_r - tab_zw + 1]);
    translate([bolt_u, bolt_z]) circle(r = bolt_boss_r);
  }
}
module clip_tab() {
  difference() {
    along_x(tab_x0, ctab_t) clip_tab2d();
    translate([tab_x0 - 1, W/2 + bolt_u, bolt_z]) rotate([0, 90, 0])
      cylinder(d = bolt_d + bolt_clr_base, h = ctab_t + 2, $fn = 24);
  }
}
module clip_piece() {
  along_x(clip_x, clip_t) difference() {
    union() {
      hull() {
        translate([bolt_u, bolt_z]) circle(r = bolt_boss_r);
        translate([ant_out, ant_z]) circle(r = clip_r_out);
      }
      hull() {
        translate([bolt_u, bolt_z]) circle(r = bolt_boss_r);
        translate([foot_gap, bolt_z - clip_foot]) square([2.5, clip_foot]);
      }
    }
    translate([ant_out, ant_z]) circle(r = clip_r_in);
    translate([ant_out - 0.38*ant_d, ant_z]) square([0.76*ant_d, clip_r_out + 20]);
    translate([bolt_u, bolt_z]) circle(d = bolt_d + bolt_clr_flat, $fn = 24);
  }
}
module clip_test() {
  for (i = [0 : 2]) translate([i*16, 0, 0]) linear_extrude(clip_t) {
    r = clip_r_in + [-0.25, 0, 0.25][i];
    difference() {
      union() {
        translate([-7, 0]) square([14, 2.5]);
        hull() { translate([-4, 0]) square([8, 2.5]); translate([0, 9]) circle(r = r + clip_wall); }
      }
      translate([0, 9]) circle(r = r);
      translate([-0.38*(2*r + 0.4), 9]) square([0.76*(2*r + 0.4), 20]);
      for (n = [0 : i]) translate([-6 + n*1.8, 1.5]) square([0.9, 2]);
    }
  }
}

// =====================================================================
//  Button pod (separate part, +y = thumb side, in place)
// =====================================================================
module pod_cup() { multmatrix(pod_M) translate([0, -pl/2, -pd]) linear_extrude(pd) rr(0, pw, 0, pl, corner_r); }
module pod_solid() {        // cup, filled back to a flat face against the wall
  zb = pod_under_z(W/2 + pod_wgap);
  hull() {
    pod_cup();
    translate([pod_x0, W/2 + pod_wgap, zb]) cube([pl, 0.5, pod_z0 - zb]);
  }
}
module pod_lugs() {         // flat against the wall at each end
  for (e = [-1, 1]) {
    xe = e > 0 ? pod_x1 : pod_x0;
    xb = e > 0 ? pb_xs[1] : pb_xs[0];
    translate([0, W/2 + pod_wgap + podlug_t, 0]) rotate([90, 0, 0]) linear_extrude(podlug_t) hull() {
      translate([xb, pb_z]) circle(r = podlug_r);
      translate([e > 0 ? xe - 1 : xe, pb_z - podlug_r]) square([1, pod_z0 - (pb_z - podlug_r)]);
    }
  }
}
module link_hole() {        // wires: one straight hole through the case wall and into the pod's cavity
  translate([pod_xc, W/2 - wall - 1, link_z]) rotate([-90, 0, 0]) cylinder(d = link_hole_d, h = wall + 1 + pod_wgap + 12);
}
module pod_bolt_holes(d) {
  for (xb = pb_xs) translate([xb, W/2 - wall - 1, pb_z]) rotate([-90, 0, 0]) cylinder(d = d, h = wall + pod_wgap + podlug_t + 2, $fn = 24);
}
module pod_cuts() {
  multmatrix(pod_M) translate([wall, -pin_l/2, -pin_h]) cube([pin_w, pin_l, pin_h + 20]);    // cavity
  multmatrix(pod_M) snap_pockets(-pin_l/2, pin_l/2, 0, pod_tabs());
  // pod-lid pry notches on the hand and elbow faces, over the lid's snap tabs
  for (s = [-1, 1]) multmatrix(pod_M)
    translate([btn_X - 3, s > 0 ? pin_l/2 - 1 : -pin_l/2 - wall - 1, -1.2]) cube([6, wall + 2, 1.3]);
  link_hole();
  pod_bolt_holes(bolt_d + bolt_clr_flat);
}
module pod_posts() {
  q = switch_w/2 + 0.3 + sw_post_d/2;
  multmatrix(pod_M) for (dx = [-1, 1], dy = [-1, 1])
    translate([btn_X + dx*q, dy*q, -pin_h - 0.01]) cylinder(d = sw_post_d, h = sw_post_h + 0.01, $fn = 16);
}
module pod_part() {
  difference() { union() { pod_solid(); pod_lugs(); } pod_cuts(); }
  pod_posts();
}

// =====================================================================
//  Base
// =====================================================================
module body_outer() {
  intersection() {
    linear_extrude(H_top + 1) rr(0, L, -W/2, W/2, corner_r);
    union() {
      translate([-1, -W, 0]) cube([L + 2, 2*W, H_side]);                       // side walls
      intersection() {                                                         // hand-end wall: full profile
        translate([L - wall, -W, 0]) cube([wall + 1, 2*W, H_top + 1]);
        prism_x(-1, L + 1) prof2d(-1);
      }
      intersection() {                                                         // elbow-end wall: up to the hinge axis
        translate([-1, -W, 0]) cube([wall + 1, 2*W, hg_az]);
        prism_x(-1, L + 1) prof2d(-1);
      }
    }
  }
}
module base_knuckle2d() {
  hull() {
    translate([hg_ax, hg_az]) circle(r = hg_r);
    translate([0, hg_zw]) square([max(0.25, hg_ax + hg_r), hg_az - hg_zw]);
  }
}
module base_knuckles() {
  across_y(hg_kl + hg_gap, hg_ko) base_knuckle2d();
  across_y(-hg_ko, -(hg_kl + hg_gap)) base_knuckle2d();
}
module base() {
  difference() {
    union() {
      body_outer();
      base_lugs();
      pinky() { base_lugs(); sma_boss(); clip_tab(); }
      base_knuckles();
    }
    translate([0, 0, floor_t])
      linear_extrude(H_top + 2) rr(wall, L - wall, -W/2 + wall, W/2 - wall, max(corner_r - wall, 0.5));
    // USB: open-bottomed notch in the thumb wall
    translate([usb_xw - usb_w/2, W/2 - wall - 1, -1]) cube([usb_w, wall + 2, usb_top + 1]);
    // pod: wire hole and two bolt holes
    link_hole();
    pod_bolt_holes(bolt_d + bolt_clr_base);
    pinky() sma_cuts();
    // motors and their wires
    translate([tail_end == "hand" ? L - wall - 1 : -1, 0, 0]) rotate([90, 0, 90]) linear_extrude(wall + 2)
      rr(tail_yc - tail_hole[0]/2, tail_yc + tail_hole[0]/2, tail_zc - tail_hole[1]/2, tail_zc + tail_hole[1]/2, 1);
    // hinge: bolt hole, room for the lid's knuckle
    translate([hg_ax, -hg_ko - 1, hg_az]) rotate([-90, 0, 0]) cylinder(d = hg_hole, h = 2*hg_ko + 2, $fn = 24);
    translate([hg_ax, -(hg_kl + hg_gap), hg_az]) rotate([-90, 0, 0]) cylinder(r = hg_r + hg_clr, h = 2*(hg_kl + hg_gap));
    translate([-1, -(hg_kl + hg_gap), hg_az - hg_r - hg_clr]) cube([wall + 1.01, 2*(hg_kl + hg_gap), 20]);   // slot for the lid's knuckle
    // hand end: notch for the lid's flap bridge, groove for its click bump
    translate([L - wall - 0.5, -(fl_w/2 + 0.4), H_top - lid_t - 0.25]) cube([wall + 2, fl_w + 0.8, 10]);
    translate([L - fl_groove_d, -(fl_w/2 + 0.4), H_top - fl_h + fl_bump_z - 0.3]) cube([fl_groove_d + 1, fl_w + 0.8, fl_bump_h + 0.6]);
    cutouts_3d();
  }
  mount_pillars();
}

function hole_xy(h) = [board_x0 + board_l - h[0], board_y0 + board_w - h[1]];
module mount_pillars() {
  for (h = mount_holes) translate([hole_xy(h)[0], hole_xy(h)[1], floor_t - 0.01]) {
    cylinder(d = pillar_d, h = pcb_bot - floor_t + 0.01);
    cylinder(d = mount_hole_d - pin_clr, h = pcb_top + pin_above - floor_t - 0.6);
    translate([0, 0, pcb_top + pin_above - floor_t - 0.6])
      cylinder(d1 = mount_hole_d - pin_clr, d2 = mount_hole_d - pin_clr - 0.6, h = 0.6);
  }
}

// =====================================================================
//  Lid, in place (closed)
// =====================================================================
module main_lid() {
  lx0 = wall;                      // elbow end: the lid's end plate covers the end wall
  lx1 = L - wall - lid_gx;
  yi  = W/2 - wall - lid_lip_clr;  // outer face of the lips
  difference() {
    union() {
      prism_x(lx0, lx1) difference() { prof2d(H_side); prof_in2d(); }        // shell
      for (s = [-1, 1])                                                       // side lips
        translate([lx0 + 1.2, s > 0 ? yi - lid_lip_t : -yi, H_side - lid_lip_h]) cube([lx1 - lx0 - 2.2, lid_lip_t, lid_lip_h + 1]);
      intersection() {                                                        // end plate over the elbow-end wall
        prism_x(0, lx0 + 0.01) prof2d(H_side);
        translate([-1, -W, hg_az + hg_zg]) cube([lx0 + 2, 2*W, 20]);
      }
      across_y(-hg_kl, hg_kl) {                                               // hinge knuckle
        hull() {
          translate([hg_ax, hg_az]) circle(r = hg_r);
          translate([hg_ax - hg_r + 1, H_top - lid_t]) square([lx0 + 3 - (hg_ax - hg_r + 1), lid_t]);
        }
        translate([hg_ax, hg_az - hg_r]) square([lx0 - hg_ax, hg_r]);       // fills its slot in the end wall
      }
      // click flap over the hand-end wall
      translate([lx1 - 0.01, -fl_w/2, H_top - lid_t]) cube([L + fl_gap + fl_t - lx1 + 0.01, fl_w, lid_t]);
      translate([L + fl_gap, -fl_w/2, H_top - fl_h]) cube([fl_t, fl_w, fl_h]);
      translate([L + fl_gap + 0.01, -fl_w/2, H_top - fl_h + fl_bump_z]) across_y(0, fl_w)
        polygon([[0, 0], [-fl_bump, fl_bump], [-fl_bump, fl_bump_h - fl_bump], [0, fl_bump_h]]);
    }
    translate([hg_ax, -hg_kl - 1, hg_az]) rotate([-90, 0, 0]) cylinder(d = hg_hole, h = 2*hg_kl + 2, $fn = 24);
    for (s = [-1, 1])                                                         // room round the base knuckles
      translate([hg_ax, s > 0 ? hg_kl + 0.001 : -(hg_ko + hg_gap), hg_az]) rotate([-90, 0, 0])
        cylinder(r = hg_r + hg_clr, h = hg_ko + hg_gap - hg_kl - 0.001);
  }
}
module lid_open(a) {   // lid swung open by a degrees about the hinge
  translate([hg_ax, 0, hg_az]) rotate([0, -a, 0]) translate([-hg_ax, 0, -hg_az]) main_lid();
}

// pod lid in pod-local coordinates (unchanged)
module pod_lid_local() {
  difference() {
    snap_lid(wall, wall + pin_w, -pin_l/2, pin_l/2, pod_tabs());
    translate([btn_X, 0, -lip_h - 1]) cylinder(d = cap_hole, h = lid_t + lip_h + 2);
    translate([btn_X, 0, -lip_h - 1]) cylinder(d = flange_d + 0.8, h = lip_h + 1);
    translate([wall - 1, -(link_hole_d/2 + 1), -lip_h - 1])
      cube([lip_clr + lip_t + 1.5, link_hole_d + 2, lip_h + 1 - 0.01]);
  }
}
module cap() {
  cylinder(d = stem_d, h = stem_len + 0.01);
  translate([0, 0, stem_len]) cylinder(d = flange_d, h = collar_t + 0.01);
  translate([0, 0, stem_len + collar_t]) cylinder(d1 = flange_d, d2 = cap_d, h = cham + 0.01);
  translate([0, 0, cap_ft - 0.01]) cylinder(d = cap_d, h = cap_top - cap_ft + 0.01);
}

// =====================================================================
//  Ghost parts and hardware
// =====================================================================
module ghost_board()   { translate([0, 0, pcb_bot]) difference() {
    translate([board_x0, board_y0, 0]) cube([board_l, board_w, 1.6]);
    for (h = mount_holes) translate([hole_xy(h)[0], hole_xy(h)[1], -1]) cylinder(d = mount_hole_d, h = 4); } }
module ghost_cell()    { translate([board_x0 + 18, board_yc, cell_top - 9.25]) rotate([0, 90, 0]) cylinder(d = 18.5, h = 65); }
module ghost_drv()     { translate([drv_xc - drv_l/2, drv_y, drv_z0]) cube([drv_l, drv_t, drv_h]); }
module ghost_switch()  { multmatrix(pod_M) translate([btn_X - switch_w/2, -switch_w/2, -pin_h]) cube([switch_w, switch_w, switch_h]); }
module ghost_antenna() { pinky() {
    translate([ant_x, W/2 - wall, ant_z]) rotate([90, 0, 0]) cylinder(r = hex_r, h = sma_back);
    translate([ant_x, W/2 + boss_t, ant_z]) rotate([-90, 0, 0]) cylinder(d = 9.2, h = ant_nut);            // panel nut
    translate([ant_x, W/2 + boss_t, ant_z]) rotate([-90, 0, 0]) cylinder(d = 9, h = ant_nut + ant_reach - ant_d0);
    translate([ant_x, W/2 + ant_out, ant_z]) rotate([0, 90, 0]) cylinder(d1 = ant_d0, d2 = ant_d1, h = ant_len); } }
module m3_head() { cylinder(d = 5.5, h = 3, $fn = 24); }
module m3_nut()  { cylinder(r = nut_af/sqrt(3), h = nut_h, $fn = 6); }
module hw_bars()  {   // both sides: head on the bar tab, nut in the lug recess
  for (side = [0, 1]) mirror([0, side, 0]) for (xb = bar_xs) translate([xb, W/2 + lug_u, 0]) {
    translate([0, 0, bar_top]) m3_head();
    translate([0, 0, bar_top - 8]) cylinder(d = 3, h = 8, $fn = 16);
    translate([0, 0, 0.2]) rotate([0, 0, 30]) m3_nut();
  }
}
module hw_pod()   { for (xb = pb_xs) translate([xb, 0, pb_z]) rotate([-90, 0, 0]) {
    translate([0, 0, W/2 + pod_wgap + podlug_t]) m3_head();
    translate([0, 0, W/2 + pod_wgap + podlug_t - 10]) cylinder(d = 3, h = 10, $fn = 16);
    translate([0, 0, W/2 - wall - nut_h]) rotate([0, 0, 30]) m3_nut(); } }
module hw_hinge() { translate([hg_ax, 0, hg_az]) rotate([-90, 0, 0]) {
    translate([0, 0, hg_ko]) m3_head();
    translate([0, 0, hg_ko + 3 - 30]) cylinder(d = 3, h = 30, $fn = 16);
    translate([0, 0, -hg_ko - nut_h]) m3_nut(); } }
module hardware() { hw_bars(); hw_pod(); hw_hinge(); }

// =====================================================================
//  Output
// =====================================================================
if (part == "assembly") arm_m() {
  color("slateblue") base();
  color("mediumpurple") bar_thumb();
  color("mediumpurple") pinky() bar_pinky();
  color("royalblue") pod_part();
  color("lightsteelblue", 0.85) main_lid();
  color("lightsteelblue", 0.85) multmatrix(pod_M) pod_lid_local();
  color("orange") multmatrix(pod_M) translate([btn_X, 0, sw_top]) cap();
  color("darkorange") pinky() clip_piece();
  color("silver") hardware();
  %union() { ghost_board(); ghost_cell(); ghost_drv(); ghost_switch(); ghost_antenna(); }
}
if (part == "base")      arm_m() base();                                                     // upright on its floor
if (part == "bar_thumb") translate([0, 0, bar_top]) rotate([180, 0, 0]) arm_m() { bar_thumb(); if (bar_ribs) bar_ribs3d(); }            // upside down
if (part == "bar_pinky") translate([0, 0, bar_top]) rotate([180, 0, 0]) arm_m() pinky() { bar_pinky(); if (bar_ribs) bar_ribs3d(); }    // upside down
if (part == "pod")       translate([0, 0, -(W/2 + pod_wgap)]) rotate([arm == "right" ? -90 : 90, 0, 0]) arm_m() pod_part();   // on its back
if (part == "lid")       translate([0, 0, H_top]) rotate([180, 0, 0]) arm_m() main_lid();    // flat top on the bed
if (part == "clip")      rotate([0, -90, 0]) translate([-clip_x, 0, 0]) arm_m() pinky() clip_piece();
if (part == "pod_lid")   translate([0, 0, lid_t]) rotate([180, 0, 0]) arm_m() pod_lid_local();
if (part == "cap")       translate([0, 0, cap_top]) rotate([180, 0, 0]) cap();
if (part == "clip_test") clip_test();
